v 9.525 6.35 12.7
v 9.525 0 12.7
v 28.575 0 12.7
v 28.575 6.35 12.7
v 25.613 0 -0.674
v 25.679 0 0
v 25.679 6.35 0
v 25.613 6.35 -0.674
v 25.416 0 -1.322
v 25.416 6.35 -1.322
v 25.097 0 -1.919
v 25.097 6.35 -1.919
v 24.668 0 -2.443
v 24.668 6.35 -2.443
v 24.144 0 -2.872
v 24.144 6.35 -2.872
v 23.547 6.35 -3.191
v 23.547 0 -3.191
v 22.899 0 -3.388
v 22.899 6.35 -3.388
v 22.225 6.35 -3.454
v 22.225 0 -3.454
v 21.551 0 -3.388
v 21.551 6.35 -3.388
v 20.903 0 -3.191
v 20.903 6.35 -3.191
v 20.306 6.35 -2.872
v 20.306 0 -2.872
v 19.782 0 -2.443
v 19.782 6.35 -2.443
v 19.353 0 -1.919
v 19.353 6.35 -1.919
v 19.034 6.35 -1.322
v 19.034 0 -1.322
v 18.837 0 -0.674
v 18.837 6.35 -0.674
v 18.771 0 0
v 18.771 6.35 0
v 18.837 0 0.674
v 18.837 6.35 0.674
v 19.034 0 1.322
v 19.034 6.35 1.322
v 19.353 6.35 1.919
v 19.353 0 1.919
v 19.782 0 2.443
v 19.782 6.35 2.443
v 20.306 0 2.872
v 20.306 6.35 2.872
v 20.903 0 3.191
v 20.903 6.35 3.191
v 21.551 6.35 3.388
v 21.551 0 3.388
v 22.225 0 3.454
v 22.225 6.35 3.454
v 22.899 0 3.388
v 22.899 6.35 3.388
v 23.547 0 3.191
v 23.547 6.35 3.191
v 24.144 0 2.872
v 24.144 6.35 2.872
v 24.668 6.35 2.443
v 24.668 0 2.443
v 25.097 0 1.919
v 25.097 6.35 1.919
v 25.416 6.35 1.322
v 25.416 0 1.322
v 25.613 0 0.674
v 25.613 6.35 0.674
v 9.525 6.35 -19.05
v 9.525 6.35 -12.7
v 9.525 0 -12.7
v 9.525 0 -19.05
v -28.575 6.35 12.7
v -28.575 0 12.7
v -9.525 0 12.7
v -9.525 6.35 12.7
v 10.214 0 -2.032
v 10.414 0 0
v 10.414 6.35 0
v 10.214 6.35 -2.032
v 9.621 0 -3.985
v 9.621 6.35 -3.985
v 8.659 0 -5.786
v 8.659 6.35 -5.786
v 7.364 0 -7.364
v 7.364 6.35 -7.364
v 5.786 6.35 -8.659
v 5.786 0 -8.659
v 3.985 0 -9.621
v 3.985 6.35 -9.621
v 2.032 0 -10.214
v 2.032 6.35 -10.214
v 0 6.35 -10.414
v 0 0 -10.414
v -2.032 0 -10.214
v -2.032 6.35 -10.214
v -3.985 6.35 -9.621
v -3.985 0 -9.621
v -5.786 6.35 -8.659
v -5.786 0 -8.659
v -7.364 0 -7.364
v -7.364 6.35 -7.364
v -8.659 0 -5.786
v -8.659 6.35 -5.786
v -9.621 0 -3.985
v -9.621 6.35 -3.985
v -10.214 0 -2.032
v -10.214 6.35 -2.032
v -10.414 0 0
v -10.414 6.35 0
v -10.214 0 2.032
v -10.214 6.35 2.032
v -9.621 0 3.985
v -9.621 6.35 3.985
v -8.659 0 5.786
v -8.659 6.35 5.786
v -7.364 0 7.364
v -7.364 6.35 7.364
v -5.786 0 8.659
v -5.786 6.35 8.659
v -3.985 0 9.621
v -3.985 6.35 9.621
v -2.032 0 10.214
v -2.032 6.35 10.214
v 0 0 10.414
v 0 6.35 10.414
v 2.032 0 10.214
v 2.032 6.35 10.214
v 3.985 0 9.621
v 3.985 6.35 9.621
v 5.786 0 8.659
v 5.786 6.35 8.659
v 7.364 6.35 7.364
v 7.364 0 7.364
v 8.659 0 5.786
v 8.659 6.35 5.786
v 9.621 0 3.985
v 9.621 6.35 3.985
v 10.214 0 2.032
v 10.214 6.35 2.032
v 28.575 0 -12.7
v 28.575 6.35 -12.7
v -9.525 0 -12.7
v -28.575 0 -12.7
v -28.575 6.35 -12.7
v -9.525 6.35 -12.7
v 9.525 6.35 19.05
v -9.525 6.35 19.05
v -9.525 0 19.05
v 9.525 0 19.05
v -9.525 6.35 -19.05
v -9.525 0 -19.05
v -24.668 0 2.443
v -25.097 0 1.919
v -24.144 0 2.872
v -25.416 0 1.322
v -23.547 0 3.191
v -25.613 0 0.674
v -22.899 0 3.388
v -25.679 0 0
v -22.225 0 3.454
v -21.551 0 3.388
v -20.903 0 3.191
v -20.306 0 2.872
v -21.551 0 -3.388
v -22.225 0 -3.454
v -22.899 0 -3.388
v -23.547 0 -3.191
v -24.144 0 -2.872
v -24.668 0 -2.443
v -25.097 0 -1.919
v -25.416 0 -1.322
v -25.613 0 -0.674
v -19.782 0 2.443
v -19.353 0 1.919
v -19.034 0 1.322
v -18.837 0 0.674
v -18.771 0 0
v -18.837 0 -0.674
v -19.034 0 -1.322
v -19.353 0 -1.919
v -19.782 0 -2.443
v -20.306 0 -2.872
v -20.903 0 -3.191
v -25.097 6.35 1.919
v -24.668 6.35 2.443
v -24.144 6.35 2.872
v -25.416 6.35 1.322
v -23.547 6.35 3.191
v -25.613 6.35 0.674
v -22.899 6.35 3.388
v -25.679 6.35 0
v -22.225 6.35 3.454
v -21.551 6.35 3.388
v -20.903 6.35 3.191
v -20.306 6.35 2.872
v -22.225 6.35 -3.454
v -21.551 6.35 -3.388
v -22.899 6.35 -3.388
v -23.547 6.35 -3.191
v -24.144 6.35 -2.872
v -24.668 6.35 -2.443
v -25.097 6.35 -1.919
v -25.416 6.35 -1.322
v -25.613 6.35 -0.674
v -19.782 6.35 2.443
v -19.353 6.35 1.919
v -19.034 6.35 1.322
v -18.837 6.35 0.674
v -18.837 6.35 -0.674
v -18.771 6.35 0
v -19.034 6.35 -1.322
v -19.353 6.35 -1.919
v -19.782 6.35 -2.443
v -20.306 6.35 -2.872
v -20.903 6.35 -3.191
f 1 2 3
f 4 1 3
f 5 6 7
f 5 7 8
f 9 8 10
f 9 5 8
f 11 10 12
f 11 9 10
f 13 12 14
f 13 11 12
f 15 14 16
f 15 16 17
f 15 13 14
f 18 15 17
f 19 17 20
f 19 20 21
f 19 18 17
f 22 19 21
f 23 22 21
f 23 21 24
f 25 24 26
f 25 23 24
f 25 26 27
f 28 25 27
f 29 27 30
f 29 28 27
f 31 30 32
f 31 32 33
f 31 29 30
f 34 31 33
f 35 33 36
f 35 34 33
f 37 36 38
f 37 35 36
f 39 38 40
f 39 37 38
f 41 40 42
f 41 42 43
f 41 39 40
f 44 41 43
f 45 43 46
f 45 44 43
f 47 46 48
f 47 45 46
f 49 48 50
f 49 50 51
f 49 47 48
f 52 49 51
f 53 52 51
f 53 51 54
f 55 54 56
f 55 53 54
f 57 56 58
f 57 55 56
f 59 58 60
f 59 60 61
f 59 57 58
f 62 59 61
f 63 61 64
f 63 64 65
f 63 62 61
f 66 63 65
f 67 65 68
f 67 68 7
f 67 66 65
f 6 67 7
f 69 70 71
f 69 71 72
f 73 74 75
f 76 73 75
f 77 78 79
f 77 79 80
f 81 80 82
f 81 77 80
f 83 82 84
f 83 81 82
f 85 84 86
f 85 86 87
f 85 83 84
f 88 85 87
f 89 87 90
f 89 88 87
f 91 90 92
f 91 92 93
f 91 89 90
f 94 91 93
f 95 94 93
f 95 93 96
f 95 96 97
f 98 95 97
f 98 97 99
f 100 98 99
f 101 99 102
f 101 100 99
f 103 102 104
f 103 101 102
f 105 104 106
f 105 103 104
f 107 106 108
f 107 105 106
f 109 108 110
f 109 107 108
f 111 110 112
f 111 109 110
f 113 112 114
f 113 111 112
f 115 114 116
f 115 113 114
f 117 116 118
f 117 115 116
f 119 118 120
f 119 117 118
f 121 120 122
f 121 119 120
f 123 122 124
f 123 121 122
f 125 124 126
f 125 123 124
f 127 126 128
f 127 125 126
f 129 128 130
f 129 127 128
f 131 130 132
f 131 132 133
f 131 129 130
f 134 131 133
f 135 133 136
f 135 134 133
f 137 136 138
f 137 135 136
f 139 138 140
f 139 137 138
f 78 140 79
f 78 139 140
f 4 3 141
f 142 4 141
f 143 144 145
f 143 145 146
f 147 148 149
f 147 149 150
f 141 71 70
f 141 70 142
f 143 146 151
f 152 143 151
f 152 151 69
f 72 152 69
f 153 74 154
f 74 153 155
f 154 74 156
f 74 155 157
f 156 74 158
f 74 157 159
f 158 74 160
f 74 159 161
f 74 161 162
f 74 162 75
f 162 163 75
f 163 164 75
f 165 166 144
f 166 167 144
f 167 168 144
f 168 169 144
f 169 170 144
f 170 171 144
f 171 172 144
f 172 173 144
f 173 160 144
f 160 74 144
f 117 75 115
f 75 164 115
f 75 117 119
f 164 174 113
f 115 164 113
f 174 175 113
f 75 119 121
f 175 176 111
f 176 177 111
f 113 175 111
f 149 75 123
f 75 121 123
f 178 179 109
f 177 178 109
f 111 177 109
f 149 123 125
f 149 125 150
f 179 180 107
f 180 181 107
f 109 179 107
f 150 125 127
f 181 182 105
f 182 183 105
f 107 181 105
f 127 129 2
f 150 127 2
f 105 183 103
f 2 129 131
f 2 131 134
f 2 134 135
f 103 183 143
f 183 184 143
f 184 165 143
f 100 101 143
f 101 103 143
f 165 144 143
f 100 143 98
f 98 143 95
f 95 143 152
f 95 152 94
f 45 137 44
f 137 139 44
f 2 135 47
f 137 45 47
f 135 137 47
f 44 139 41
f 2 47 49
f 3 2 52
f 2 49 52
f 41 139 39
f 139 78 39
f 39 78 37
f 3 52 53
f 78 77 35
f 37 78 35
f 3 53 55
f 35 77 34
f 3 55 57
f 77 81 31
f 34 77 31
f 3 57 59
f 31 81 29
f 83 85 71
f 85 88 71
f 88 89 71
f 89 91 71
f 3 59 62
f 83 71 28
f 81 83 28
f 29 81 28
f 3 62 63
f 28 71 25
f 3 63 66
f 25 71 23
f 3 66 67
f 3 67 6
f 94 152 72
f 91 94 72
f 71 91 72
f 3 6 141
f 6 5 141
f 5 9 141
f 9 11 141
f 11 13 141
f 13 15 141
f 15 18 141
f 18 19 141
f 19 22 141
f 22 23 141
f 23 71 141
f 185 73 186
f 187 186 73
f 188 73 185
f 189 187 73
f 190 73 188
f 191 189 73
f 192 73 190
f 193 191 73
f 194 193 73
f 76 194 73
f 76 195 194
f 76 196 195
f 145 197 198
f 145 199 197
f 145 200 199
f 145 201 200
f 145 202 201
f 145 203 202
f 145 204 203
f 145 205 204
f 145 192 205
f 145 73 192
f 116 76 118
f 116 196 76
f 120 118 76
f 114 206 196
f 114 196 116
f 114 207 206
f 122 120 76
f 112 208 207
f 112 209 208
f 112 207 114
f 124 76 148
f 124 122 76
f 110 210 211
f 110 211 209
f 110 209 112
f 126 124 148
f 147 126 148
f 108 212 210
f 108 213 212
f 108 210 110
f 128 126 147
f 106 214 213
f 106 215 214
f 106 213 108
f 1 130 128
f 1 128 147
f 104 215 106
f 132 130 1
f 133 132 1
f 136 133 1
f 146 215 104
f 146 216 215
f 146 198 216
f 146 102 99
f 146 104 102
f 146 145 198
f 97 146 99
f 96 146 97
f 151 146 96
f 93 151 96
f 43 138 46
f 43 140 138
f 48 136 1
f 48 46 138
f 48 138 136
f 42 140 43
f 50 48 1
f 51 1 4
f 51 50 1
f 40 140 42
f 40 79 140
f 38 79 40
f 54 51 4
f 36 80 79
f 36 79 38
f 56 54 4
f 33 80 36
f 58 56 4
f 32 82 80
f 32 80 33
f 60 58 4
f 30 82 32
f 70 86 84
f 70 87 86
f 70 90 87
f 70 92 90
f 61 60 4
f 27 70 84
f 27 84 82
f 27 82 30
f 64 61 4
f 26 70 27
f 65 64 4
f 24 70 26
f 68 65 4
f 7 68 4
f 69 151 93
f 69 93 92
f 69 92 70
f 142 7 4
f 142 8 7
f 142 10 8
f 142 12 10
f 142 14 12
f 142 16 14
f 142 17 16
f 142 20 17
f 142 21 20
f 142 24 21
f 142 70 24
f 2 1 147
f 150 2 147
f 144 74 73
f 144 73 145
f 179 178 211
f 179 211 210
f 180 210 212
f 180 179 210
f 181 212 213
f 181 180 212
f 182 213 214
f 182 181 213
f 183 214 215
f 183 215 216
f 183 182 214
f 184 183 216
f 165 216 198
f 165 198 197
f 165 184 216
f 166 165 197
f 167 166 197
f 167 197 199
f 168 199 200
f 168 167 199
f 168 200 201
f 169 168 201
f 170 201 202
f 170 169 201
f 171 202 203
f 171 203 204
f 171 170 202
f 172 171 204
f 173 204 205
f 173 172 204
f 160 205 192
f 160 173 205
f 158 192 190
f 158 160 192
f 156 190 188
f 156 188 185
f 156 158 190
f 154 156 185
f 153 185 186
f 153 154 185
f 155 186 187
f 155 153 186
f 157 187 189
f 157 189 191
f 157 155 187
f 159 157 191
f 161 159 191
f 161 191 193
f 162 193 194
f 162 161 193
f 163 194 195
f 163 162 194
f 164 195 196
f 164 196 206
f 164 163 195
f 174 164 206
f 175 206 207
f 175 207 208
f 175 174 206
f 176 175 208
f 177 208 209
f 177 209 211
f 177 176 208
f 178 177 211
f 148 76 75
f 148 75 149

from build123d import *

# Parameters (mm, degrees)
SKETCH1_W           = 57.15
SKETCH1_H           = 25.4
SKETCH1_R           = 10.414
SKETCH1_R_2         = 3.4544
BOSS_EXTRUDE1_DEPTH = 6.35
SKETCH2_W           = 19.05
SKETCH2_H           = 6.35
BOSS_EXTRUDE2_DEPTH = 6.35


with BuildPart() as part:
    # Sketch1 → Boss-Extrude1 (new body)
    with BuildSketch(Plane(origin=(0, 0, 0), x_dir=(1, 0, 0), z_dir=(0, 1, 0))):
        Rectangle(SKETCH1_W, SKETCH1_H)
        Circle(SKETCH1_R, mode=Mode.SUBTRACT)
        with Locations((-22.225, 0)):
            Circle(SKETCH1_R_2, mode=Mode.SUBTRACT)
        with Locations((22.225, 0)):
            Circle(SKETCH1_R_2, mode=Mode.SUBTRACT)
    extrude(amount=BOSS_EXTRUDE1_DEPTH)

    # Sketch2 → Boss-Extrude2 (add)
    with BuildSketch(Plane(origin=(0, 6.35, 0), x_dir=(1, 0, 0), z_dir=(0, 1, 0))):
        with Locations((0, 15.875)):
            Rectangle(SKETCH2_W, SKETCH2_H)
    boss_extrude2 = extrude(amount=-BOSS_EXTRUDE2_DEPTH)

    # Mirror1: Boss-Extrude2 across plane
    add(boss_extrude2.mirror(Plane.XY))


solid = part.part
